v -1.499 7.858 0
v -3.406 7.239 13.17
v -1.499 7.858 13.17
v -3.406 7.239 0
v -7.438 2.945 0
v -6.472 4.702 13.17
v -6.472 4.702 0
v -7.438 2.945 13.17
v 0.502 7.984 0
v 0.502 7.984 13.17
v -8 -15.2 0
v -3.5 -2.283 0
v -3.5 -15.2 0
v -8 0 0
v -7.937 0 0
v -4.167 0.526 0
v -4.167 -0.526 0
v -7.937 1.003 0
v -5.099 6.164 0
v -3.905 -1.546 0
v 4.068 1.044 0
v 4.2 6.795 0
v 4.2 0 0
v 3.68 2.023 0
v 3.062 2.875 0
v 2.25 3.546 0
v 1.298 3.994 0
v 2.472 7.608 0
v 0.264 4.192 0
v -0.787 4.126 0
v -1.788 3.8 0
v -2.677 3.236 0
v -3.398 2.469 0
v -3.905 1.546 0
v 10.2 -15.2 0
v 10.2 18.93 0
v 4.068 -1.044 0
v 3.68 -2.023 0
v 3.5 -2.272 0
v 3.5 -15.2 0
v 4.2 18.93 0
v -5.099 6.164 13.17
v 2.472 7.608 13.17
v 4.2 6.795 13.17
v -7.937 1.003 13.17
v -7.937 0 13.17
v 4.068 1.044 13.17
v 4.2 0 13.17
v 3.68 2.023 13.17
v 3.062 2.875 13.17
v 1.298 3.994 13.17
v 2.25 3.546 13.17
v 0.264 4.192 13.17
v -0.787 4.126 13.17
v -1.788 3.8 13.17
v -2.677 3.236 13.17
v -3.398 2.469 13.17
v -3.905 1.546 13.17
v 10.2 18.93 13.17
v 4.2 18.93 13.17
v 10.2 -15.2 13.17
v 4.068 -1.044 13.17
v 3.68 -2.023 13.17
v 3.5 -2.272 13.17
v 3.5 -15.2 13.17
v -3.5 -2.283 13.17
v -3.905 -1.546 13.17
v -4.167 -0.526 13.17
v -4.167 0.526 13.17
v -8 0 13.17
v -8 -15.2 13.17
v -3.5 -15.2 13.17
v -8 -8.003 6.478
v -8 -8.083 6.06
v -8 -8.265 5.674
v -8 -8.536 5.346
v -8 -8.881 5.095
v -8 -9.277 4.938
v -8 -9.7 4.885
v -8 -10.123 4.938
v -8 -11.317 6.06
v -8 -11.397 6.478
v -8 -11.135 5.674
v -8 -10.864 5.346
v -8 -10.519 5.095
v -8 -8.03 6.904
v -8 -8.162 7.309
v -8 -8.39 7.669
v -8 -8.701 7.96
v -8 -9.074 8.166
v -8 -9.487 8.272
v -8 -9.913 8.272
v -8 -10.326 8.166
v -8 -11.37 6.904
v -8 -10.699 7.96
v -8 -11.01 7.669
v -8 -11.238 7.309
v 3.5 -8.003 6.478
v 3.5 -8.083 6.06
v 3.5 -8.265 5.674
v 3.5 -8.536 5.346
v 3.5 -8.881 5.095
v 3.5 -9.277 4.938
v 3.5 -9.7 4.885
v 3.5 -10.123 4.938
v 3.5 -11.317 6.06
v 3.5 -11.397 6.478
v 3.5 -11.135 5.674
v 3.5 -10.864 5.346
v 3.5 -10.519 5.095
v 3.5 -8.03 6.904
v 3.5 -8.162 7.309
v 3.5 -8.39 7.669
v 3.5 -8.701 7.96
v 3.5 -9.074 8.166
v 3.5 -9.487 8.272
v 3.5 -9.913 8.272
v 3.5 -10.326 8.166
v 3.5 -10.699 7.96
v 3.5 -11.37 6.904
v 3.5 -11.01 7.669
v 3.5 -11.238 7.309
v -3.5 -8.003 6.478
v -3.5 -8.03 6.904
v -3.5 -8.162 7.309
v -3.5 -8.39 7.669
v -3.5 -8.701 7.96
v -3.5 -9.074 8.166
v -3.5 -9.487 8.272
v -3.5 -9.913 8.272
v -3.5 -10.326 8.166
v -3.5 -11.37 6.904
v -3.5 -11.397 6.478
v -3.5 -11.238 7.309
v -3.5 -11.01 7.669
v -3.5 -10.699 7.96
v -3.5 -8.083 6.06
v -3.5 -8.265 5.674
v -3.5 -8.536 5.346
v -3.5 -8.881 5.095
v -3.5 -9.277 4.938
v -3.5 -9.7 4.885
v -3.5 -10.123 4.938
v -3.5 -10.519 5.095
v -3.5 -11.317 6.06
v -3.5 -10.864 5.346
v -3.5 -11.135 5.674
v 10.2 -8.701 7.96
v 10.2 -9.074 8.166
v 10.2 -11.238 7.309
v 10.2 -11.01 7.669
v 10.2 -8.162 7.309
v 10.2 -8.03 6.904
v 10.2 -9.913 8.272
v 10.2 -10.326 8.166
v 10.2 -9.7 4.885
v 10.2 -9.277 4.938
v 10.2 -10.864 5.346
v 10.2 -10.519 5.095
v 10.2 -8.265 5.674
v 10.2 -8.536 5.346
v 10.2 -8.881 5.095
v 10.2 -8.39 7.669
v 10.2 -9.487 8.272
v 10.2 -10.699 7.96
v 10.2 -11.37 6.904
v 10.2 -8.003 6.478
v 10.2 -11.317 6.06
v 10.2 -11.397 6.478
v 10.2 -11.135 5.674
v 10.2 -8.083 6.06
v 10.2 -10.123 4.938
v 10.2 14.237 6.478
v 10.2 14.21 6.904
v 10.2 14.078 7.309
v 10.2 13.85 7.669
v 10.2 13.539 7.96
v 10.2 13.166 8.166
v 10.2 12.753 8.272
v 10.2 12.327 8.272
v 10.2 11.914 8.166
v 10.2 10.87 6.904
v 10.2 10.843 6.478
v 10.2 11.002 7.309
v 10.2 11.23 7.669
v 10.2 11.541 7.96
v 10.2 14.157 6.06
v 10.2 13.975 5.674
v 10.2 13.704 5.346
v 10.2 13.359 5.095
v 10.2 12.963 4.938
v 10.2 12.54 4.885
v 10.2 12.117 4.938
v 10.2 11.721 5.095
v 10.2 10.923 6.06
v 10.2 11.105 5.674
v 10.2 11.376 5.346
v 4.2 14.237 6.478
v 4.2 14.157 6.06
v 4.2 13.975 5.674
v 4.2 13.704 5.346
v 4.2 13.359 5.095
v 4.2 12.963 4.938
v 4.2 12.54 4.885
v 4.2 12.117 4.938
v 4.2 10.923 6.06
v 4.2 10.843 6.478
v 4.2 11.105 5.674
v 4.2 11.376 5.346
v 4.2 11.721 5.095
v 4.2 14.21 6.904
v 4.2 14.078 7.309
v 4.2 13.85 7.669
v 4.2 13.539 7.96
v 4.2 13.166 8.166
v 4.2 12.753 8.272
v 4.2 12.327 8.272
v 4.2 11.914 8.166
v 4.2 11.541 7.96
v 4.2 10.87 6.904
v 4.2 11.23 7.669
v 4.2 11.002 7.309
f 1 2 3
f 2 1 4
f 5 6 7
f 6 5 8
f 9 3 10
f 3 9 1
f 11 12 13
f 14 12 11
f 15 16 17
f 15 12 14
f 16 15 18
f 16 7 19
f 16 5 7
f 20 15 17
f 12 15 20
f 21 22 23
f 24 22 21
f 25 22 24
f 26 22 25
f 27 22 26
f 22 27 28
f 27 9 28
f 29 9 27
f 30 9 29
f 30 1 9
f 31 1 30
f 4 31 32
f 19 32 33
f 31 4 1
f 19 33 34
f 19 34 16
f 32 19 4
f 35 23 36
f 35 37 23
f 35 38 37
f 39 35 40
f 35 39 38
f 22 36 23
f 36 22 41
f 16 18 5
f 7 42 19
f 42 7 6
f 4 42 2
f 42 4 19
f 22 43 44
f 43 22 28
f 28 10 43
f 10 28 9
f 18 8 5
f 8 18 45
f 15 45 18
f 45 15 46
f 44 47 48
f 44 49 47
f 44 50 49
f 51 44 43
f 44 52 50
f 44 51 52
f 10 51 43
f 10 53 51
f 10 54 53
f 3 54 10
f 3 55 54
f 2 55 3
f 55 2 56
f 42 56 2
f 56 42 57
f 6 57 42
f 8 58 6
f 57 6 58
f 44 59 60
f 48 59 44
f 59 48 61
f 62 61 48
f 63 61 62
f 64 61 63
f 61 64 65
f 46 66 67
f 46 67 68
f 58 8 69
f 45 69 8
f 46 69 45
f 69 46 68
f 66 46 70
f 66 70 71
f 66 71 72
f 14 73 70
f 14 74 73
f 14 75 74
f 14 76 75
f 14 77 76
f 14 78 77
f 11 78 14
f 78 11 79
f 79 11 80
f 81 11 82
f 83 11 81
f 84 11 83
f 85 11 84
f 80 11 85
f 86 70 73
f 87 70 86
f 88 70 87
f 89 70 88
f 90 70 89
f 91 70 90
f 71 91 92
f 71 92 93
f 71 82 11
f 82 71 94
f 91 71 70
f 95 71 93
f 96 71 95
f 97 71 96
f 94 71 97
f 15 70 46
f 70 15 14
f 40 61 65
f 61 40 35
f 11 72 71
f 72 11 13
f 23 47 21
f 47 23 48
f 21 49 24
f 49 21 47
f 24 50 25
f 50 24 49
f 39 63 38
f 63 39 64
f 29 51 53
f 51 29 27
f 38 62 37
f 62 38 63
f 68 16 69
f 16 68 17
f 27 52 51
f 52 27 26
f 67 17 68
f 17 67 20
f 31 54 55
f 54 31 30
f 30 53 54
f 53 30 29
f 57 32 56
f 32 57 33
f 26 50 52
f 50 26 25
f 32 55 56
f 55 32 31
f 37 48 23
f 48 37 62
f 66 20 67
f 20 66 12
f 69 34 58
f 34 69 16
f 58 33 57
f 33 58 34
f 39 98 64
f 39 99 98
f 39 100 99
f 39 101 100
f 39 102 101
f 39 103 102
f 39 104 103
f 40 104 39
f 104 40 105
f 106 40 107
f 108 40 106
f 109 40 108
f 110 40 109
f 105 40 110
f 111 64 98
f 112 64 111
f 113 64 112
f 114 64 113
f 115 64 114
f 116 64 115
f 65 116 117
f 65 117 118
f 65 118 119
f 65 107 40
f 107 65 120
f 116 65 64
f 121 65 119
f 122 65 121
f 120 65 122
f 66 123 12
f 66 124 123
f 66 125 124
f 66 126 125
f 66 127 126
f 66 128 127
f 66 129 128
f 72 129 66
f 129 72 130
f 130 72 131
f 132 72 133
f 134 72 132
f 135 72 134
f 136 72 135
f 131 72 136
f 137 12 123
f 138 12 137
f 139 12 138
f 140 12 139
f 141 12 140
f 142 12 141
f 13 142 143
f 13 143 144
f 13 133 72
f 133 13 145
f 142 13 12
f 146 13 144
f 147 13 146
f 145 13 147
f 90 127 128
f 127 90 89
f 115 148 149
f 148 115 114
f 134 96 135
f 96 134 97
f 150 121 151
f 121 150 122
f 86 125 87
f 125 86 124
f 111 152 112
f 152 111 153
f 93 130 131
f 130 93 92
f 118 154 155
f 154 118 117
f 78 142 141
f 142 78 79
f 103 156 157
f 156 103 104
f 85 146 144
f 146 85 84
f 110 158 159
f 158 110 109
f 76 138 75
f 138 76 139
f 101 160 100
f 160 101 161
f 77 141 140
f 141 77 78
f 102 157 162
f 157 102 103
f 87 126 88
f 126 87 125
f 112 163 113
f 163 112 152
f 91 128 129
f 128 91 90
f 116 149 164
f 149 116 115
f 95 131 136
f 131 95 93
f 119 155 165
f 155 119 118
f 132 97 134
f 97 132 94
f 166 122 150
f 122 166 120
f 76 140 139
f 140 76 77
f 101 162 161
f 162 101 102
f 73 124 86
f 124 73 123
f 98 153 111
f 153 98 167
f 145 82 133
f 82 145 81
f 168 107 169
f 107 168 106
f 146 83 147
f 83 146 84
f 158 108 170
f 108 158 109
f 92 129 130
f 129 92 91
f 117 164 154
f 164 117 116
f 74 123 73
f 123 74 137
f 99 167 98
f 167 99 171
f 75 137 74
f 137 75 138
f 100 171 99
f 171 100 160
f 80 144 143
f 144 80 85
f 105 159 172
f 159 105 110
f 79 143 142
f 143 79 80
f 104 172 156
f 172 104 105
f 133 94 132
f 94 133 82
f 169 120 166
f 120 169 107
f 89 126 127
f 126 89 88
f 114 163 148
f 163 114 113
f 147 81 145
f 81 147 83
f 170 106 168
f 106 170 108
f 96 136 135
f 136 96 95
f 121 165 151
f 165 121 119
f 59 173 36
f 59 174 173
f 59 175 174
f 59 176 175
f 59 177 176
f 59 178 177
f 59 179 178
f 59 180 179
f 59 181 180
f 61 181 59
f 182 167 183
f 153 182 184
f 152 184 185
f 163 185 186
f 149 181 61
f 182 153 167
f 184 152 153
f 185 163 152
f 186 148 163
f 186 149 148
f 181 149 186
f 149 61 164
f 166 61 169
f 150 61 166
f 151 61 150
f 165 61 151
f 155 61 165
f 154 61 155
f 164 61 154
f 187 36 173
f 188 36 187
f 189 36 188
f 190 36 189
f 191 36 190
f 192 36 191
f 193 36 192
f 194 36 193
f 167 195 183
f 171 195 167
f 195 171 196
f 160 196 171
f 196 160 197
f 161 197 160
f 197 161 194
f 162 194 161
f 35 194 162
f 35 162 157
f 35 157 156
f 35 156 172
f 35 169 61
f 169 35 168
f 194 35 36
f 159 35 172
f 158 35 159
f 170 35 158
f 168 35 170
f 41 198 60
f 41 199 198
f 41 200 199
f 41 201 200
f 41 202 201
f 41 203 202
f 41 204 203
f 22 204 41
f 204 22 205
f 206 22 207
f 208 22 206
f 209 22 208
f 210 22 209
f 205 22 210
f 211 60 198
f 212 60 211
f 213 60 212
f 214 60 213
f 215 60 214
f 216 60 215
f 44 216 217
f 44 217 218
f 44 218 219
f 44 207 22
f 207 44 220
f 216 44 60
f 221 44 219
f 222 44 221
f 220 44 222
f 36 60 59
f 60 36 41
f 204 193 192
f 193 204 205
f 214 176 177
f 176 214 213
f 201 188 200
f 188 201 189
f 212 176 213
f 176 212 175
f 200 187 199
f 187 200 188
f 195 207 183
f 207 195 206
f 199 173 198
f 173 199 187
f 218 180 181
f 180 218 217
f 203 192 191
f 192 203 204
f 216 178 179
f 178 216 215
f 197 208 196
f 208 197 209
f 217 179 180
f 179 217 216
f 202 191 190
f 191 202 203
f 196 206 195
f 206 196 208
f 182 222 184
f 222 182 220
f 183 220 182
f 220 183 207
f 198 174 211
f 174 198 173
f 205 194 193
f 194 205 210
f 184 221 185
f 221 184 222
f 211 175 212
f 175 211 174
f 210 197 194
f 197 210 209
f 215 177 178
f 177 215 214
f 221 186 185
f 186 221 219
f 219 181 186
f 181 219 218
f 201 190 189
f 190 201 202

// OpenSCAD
// file: library/component-data.scad
// ========================================================================================
// Robori Mendel
// Dimensions of standard components
// GNU GPL v3
//
// Contact : support@robori.com
// Reference : http://www.robori.com/documentation/Mendel
//
// History :
// 31 Jan 2015 - First version
// ========================================================================================

// Linear bearing LM8UU
LM8UU_L = 24;
LM8UU_OD = 15;
LM8UU_ID = 8;

// Pulley GT2
PULLEY_GT2_ID = 5;
PULLEY_GT2_OD = 18;
PULLEY_GT2_L = 18.5;
PULLEY_GT2_FLANGE_L = 1.5;
PULLEY_GT2_TEETH_L = 7.5;
PULLEY_GT2_TEETH_OD = 10;
PULLEY_GT2_HUB_L =  PULLEY_GT2_L - PULLEY_GT2_FLANGE_L - PULLEY_GT2_TEETH_L;		// = 9.5

// Nylock nut
NYLOCK_NUT_M5_H = 5;

// NEMA 17
NEMA17_L = 42;
NEMA17_SCREW_FROM_EDGE = (42 - 31)/2;
NEMA17_SCREW_SIZE = 3;

// Fan 40mm x 40mm
FAN40_L = 40;
FAN40_ID = 38;
FAN40_SCREW_D = 3.4;
FAN40_SCREW_FROM_EDGE = 4;

// Washer
WASHER_M3_ID = 3.2;
WASHER_M3_OD = 6;
WASHER_M3_H = 0.5;
// file: library/component.scad
// ========================================================================================
// Robori Mendel
// RP library
// GNU GPL v3
//
// Contact : support@robori.com
// Reference : http://www.robori.com/documentation/Mendel
//
// History :
// 31 Jan 2015 - First version
// ========================================================================================

include <component-data.scad>

component_fn = 25;

// Rod clamp
module clamp(in_dia, out_dia, leg_length, leg_space, height, screw_dia, screw_dist_from_end)
{
	difference()
	{
		union()
		{
			cylinder(h=height, r=out_dia/2, center=false, $fn=component_fn);
			translate([-out_dia/2, -in_dia/2 - leg_length, 0]) cube([out_dia, in_dia/2 + leg_length, height]);
		}
		// hole
		translate([0, 0, -1]) cylinder(h=height + 2, r=in_dia/2, center=false, $fn=component_fn);
		// leg space
		translate([-leg_space/2, -in_dia/2 - leg_length - 1, -1]) cube([leg_space, in_dia/2 + leg_length + 1, height + 2]);
		// screw hole
		translate([-out_dia/2 - 1, -in_dia/2 - leg_length + screw_dist_from_end, height/2]) rotate([0, 90, 0]) cylinder(h=out_dia + 2, r=screw_dia/2, center=false, $fn=component_fn);
	}
}

// LM8UU holder
lm8uu_holder_wall_t = 3;
lm8uu_holder_cone_l = 2;
lm8uu_holder_slot_w = 9;
lm8uu_holder_id = LM8UU_OD - 0.1;
lm8uu_holder_l = LM8UU_L + lm8uu_holder_cone_l;
lm8uu_holder_w = LM8UU_OD + 2*lm8uu_holder_wall_t;
lm8uu_holder_h = LM8UU_OD + 2*lm8uu_holder_cone_l;

module lm8uu_holder()
{
	cone_d1 = 0;
	cone_d2 = LM8UU_OD + 2*lm8uu_holder_cone_l;
	cone_h = cone_d2/2;

	difference()
	{
		// Block
		cube([lm8uu_holder_l, lm8uu_holder_w, lm8uu_holder_h]);
		// Cylinder
		translate([-1, lm8uu_holder_w/2, lm8uu_holder_cone_l + LM8UU_OD/2]) rotate([0, 90, 0]) cylinder(r=lm8uu_holder_id/2, h=lm8uu_holder_l + 2, center=false, $fn=component_fn);
		// Cone
		translate([lm8uu_holder_l - cone_h + 0.01, lm8uu_holder_w/2, lm8uu_holder_cone_l + LM8UU_OD/2]) rotate([0, 90, 0]) cylinder(r1=cone_d1/2, r2=cone_d2/2, h=cone_h, center=false, $fn=component_fn);
		// Slot
		translate([-1, lm8uu_holder_w/2 - lm8uu_holder_slot_w/2, lm8uu_holder_h - lm8uu_holder_cone_l*2 - 1]) cube([lm8uu_holder_l + 2, lm8uu_holder_slot_w, lm8uu_holder_cone_l*2 + 2]);
	}
}
// main file
// ========================================================================================
// Robori Mendel
// Bottom clamp for RAMPS stack
// GNU GPL v3
//
// Contact : support@robori.com
// Reference : http://www.robori.com/documentation/Mendel
//
// History :
// 15 Feb 2015 - First version
// ========================================================================================

include <library/component.scad>

$fn = 25;

pcb_clamp_bottom();

module pcb_clamp_bottom()
{
	in_dia = 8 + 0.4;	// 2015-05-17 : increase dia by 0.4mm
	out_dia = 16;
	leg_length = 11;
	leg_space = 7;
	height = 13.17;
	screw_dia = 3 + 0.4;
	screw_dist_from_end = 5.5;

	plate_h = 6;

	difference()
	{
		union()
		{
			// clamp
			clamp(in_dia, out_dia, leg_length, leg_space, height, screw_dia, screw_dist_from_end);
			// plate
			translate([in_dia/2, -in_dia/2 - leg_length, 0]) cube([plate_h, 34.13, 13.17]);
		}
		// clamp screw hole
		translate([0, -in_dia/2 - leg_length + screw_dist_from_end, height/2]) rotate([0, 90, 0]) cylinder(r=screw_dia/2, h=out_dia + plate_h, center=false);
		// pcb screw hole
		translate([in_dia/2 - 1, 12.54, height/2]) rotate([0, 90, 0]) cylinder(r=screw_dia/2, h=plate_h + 2, center=false);
	}
}
